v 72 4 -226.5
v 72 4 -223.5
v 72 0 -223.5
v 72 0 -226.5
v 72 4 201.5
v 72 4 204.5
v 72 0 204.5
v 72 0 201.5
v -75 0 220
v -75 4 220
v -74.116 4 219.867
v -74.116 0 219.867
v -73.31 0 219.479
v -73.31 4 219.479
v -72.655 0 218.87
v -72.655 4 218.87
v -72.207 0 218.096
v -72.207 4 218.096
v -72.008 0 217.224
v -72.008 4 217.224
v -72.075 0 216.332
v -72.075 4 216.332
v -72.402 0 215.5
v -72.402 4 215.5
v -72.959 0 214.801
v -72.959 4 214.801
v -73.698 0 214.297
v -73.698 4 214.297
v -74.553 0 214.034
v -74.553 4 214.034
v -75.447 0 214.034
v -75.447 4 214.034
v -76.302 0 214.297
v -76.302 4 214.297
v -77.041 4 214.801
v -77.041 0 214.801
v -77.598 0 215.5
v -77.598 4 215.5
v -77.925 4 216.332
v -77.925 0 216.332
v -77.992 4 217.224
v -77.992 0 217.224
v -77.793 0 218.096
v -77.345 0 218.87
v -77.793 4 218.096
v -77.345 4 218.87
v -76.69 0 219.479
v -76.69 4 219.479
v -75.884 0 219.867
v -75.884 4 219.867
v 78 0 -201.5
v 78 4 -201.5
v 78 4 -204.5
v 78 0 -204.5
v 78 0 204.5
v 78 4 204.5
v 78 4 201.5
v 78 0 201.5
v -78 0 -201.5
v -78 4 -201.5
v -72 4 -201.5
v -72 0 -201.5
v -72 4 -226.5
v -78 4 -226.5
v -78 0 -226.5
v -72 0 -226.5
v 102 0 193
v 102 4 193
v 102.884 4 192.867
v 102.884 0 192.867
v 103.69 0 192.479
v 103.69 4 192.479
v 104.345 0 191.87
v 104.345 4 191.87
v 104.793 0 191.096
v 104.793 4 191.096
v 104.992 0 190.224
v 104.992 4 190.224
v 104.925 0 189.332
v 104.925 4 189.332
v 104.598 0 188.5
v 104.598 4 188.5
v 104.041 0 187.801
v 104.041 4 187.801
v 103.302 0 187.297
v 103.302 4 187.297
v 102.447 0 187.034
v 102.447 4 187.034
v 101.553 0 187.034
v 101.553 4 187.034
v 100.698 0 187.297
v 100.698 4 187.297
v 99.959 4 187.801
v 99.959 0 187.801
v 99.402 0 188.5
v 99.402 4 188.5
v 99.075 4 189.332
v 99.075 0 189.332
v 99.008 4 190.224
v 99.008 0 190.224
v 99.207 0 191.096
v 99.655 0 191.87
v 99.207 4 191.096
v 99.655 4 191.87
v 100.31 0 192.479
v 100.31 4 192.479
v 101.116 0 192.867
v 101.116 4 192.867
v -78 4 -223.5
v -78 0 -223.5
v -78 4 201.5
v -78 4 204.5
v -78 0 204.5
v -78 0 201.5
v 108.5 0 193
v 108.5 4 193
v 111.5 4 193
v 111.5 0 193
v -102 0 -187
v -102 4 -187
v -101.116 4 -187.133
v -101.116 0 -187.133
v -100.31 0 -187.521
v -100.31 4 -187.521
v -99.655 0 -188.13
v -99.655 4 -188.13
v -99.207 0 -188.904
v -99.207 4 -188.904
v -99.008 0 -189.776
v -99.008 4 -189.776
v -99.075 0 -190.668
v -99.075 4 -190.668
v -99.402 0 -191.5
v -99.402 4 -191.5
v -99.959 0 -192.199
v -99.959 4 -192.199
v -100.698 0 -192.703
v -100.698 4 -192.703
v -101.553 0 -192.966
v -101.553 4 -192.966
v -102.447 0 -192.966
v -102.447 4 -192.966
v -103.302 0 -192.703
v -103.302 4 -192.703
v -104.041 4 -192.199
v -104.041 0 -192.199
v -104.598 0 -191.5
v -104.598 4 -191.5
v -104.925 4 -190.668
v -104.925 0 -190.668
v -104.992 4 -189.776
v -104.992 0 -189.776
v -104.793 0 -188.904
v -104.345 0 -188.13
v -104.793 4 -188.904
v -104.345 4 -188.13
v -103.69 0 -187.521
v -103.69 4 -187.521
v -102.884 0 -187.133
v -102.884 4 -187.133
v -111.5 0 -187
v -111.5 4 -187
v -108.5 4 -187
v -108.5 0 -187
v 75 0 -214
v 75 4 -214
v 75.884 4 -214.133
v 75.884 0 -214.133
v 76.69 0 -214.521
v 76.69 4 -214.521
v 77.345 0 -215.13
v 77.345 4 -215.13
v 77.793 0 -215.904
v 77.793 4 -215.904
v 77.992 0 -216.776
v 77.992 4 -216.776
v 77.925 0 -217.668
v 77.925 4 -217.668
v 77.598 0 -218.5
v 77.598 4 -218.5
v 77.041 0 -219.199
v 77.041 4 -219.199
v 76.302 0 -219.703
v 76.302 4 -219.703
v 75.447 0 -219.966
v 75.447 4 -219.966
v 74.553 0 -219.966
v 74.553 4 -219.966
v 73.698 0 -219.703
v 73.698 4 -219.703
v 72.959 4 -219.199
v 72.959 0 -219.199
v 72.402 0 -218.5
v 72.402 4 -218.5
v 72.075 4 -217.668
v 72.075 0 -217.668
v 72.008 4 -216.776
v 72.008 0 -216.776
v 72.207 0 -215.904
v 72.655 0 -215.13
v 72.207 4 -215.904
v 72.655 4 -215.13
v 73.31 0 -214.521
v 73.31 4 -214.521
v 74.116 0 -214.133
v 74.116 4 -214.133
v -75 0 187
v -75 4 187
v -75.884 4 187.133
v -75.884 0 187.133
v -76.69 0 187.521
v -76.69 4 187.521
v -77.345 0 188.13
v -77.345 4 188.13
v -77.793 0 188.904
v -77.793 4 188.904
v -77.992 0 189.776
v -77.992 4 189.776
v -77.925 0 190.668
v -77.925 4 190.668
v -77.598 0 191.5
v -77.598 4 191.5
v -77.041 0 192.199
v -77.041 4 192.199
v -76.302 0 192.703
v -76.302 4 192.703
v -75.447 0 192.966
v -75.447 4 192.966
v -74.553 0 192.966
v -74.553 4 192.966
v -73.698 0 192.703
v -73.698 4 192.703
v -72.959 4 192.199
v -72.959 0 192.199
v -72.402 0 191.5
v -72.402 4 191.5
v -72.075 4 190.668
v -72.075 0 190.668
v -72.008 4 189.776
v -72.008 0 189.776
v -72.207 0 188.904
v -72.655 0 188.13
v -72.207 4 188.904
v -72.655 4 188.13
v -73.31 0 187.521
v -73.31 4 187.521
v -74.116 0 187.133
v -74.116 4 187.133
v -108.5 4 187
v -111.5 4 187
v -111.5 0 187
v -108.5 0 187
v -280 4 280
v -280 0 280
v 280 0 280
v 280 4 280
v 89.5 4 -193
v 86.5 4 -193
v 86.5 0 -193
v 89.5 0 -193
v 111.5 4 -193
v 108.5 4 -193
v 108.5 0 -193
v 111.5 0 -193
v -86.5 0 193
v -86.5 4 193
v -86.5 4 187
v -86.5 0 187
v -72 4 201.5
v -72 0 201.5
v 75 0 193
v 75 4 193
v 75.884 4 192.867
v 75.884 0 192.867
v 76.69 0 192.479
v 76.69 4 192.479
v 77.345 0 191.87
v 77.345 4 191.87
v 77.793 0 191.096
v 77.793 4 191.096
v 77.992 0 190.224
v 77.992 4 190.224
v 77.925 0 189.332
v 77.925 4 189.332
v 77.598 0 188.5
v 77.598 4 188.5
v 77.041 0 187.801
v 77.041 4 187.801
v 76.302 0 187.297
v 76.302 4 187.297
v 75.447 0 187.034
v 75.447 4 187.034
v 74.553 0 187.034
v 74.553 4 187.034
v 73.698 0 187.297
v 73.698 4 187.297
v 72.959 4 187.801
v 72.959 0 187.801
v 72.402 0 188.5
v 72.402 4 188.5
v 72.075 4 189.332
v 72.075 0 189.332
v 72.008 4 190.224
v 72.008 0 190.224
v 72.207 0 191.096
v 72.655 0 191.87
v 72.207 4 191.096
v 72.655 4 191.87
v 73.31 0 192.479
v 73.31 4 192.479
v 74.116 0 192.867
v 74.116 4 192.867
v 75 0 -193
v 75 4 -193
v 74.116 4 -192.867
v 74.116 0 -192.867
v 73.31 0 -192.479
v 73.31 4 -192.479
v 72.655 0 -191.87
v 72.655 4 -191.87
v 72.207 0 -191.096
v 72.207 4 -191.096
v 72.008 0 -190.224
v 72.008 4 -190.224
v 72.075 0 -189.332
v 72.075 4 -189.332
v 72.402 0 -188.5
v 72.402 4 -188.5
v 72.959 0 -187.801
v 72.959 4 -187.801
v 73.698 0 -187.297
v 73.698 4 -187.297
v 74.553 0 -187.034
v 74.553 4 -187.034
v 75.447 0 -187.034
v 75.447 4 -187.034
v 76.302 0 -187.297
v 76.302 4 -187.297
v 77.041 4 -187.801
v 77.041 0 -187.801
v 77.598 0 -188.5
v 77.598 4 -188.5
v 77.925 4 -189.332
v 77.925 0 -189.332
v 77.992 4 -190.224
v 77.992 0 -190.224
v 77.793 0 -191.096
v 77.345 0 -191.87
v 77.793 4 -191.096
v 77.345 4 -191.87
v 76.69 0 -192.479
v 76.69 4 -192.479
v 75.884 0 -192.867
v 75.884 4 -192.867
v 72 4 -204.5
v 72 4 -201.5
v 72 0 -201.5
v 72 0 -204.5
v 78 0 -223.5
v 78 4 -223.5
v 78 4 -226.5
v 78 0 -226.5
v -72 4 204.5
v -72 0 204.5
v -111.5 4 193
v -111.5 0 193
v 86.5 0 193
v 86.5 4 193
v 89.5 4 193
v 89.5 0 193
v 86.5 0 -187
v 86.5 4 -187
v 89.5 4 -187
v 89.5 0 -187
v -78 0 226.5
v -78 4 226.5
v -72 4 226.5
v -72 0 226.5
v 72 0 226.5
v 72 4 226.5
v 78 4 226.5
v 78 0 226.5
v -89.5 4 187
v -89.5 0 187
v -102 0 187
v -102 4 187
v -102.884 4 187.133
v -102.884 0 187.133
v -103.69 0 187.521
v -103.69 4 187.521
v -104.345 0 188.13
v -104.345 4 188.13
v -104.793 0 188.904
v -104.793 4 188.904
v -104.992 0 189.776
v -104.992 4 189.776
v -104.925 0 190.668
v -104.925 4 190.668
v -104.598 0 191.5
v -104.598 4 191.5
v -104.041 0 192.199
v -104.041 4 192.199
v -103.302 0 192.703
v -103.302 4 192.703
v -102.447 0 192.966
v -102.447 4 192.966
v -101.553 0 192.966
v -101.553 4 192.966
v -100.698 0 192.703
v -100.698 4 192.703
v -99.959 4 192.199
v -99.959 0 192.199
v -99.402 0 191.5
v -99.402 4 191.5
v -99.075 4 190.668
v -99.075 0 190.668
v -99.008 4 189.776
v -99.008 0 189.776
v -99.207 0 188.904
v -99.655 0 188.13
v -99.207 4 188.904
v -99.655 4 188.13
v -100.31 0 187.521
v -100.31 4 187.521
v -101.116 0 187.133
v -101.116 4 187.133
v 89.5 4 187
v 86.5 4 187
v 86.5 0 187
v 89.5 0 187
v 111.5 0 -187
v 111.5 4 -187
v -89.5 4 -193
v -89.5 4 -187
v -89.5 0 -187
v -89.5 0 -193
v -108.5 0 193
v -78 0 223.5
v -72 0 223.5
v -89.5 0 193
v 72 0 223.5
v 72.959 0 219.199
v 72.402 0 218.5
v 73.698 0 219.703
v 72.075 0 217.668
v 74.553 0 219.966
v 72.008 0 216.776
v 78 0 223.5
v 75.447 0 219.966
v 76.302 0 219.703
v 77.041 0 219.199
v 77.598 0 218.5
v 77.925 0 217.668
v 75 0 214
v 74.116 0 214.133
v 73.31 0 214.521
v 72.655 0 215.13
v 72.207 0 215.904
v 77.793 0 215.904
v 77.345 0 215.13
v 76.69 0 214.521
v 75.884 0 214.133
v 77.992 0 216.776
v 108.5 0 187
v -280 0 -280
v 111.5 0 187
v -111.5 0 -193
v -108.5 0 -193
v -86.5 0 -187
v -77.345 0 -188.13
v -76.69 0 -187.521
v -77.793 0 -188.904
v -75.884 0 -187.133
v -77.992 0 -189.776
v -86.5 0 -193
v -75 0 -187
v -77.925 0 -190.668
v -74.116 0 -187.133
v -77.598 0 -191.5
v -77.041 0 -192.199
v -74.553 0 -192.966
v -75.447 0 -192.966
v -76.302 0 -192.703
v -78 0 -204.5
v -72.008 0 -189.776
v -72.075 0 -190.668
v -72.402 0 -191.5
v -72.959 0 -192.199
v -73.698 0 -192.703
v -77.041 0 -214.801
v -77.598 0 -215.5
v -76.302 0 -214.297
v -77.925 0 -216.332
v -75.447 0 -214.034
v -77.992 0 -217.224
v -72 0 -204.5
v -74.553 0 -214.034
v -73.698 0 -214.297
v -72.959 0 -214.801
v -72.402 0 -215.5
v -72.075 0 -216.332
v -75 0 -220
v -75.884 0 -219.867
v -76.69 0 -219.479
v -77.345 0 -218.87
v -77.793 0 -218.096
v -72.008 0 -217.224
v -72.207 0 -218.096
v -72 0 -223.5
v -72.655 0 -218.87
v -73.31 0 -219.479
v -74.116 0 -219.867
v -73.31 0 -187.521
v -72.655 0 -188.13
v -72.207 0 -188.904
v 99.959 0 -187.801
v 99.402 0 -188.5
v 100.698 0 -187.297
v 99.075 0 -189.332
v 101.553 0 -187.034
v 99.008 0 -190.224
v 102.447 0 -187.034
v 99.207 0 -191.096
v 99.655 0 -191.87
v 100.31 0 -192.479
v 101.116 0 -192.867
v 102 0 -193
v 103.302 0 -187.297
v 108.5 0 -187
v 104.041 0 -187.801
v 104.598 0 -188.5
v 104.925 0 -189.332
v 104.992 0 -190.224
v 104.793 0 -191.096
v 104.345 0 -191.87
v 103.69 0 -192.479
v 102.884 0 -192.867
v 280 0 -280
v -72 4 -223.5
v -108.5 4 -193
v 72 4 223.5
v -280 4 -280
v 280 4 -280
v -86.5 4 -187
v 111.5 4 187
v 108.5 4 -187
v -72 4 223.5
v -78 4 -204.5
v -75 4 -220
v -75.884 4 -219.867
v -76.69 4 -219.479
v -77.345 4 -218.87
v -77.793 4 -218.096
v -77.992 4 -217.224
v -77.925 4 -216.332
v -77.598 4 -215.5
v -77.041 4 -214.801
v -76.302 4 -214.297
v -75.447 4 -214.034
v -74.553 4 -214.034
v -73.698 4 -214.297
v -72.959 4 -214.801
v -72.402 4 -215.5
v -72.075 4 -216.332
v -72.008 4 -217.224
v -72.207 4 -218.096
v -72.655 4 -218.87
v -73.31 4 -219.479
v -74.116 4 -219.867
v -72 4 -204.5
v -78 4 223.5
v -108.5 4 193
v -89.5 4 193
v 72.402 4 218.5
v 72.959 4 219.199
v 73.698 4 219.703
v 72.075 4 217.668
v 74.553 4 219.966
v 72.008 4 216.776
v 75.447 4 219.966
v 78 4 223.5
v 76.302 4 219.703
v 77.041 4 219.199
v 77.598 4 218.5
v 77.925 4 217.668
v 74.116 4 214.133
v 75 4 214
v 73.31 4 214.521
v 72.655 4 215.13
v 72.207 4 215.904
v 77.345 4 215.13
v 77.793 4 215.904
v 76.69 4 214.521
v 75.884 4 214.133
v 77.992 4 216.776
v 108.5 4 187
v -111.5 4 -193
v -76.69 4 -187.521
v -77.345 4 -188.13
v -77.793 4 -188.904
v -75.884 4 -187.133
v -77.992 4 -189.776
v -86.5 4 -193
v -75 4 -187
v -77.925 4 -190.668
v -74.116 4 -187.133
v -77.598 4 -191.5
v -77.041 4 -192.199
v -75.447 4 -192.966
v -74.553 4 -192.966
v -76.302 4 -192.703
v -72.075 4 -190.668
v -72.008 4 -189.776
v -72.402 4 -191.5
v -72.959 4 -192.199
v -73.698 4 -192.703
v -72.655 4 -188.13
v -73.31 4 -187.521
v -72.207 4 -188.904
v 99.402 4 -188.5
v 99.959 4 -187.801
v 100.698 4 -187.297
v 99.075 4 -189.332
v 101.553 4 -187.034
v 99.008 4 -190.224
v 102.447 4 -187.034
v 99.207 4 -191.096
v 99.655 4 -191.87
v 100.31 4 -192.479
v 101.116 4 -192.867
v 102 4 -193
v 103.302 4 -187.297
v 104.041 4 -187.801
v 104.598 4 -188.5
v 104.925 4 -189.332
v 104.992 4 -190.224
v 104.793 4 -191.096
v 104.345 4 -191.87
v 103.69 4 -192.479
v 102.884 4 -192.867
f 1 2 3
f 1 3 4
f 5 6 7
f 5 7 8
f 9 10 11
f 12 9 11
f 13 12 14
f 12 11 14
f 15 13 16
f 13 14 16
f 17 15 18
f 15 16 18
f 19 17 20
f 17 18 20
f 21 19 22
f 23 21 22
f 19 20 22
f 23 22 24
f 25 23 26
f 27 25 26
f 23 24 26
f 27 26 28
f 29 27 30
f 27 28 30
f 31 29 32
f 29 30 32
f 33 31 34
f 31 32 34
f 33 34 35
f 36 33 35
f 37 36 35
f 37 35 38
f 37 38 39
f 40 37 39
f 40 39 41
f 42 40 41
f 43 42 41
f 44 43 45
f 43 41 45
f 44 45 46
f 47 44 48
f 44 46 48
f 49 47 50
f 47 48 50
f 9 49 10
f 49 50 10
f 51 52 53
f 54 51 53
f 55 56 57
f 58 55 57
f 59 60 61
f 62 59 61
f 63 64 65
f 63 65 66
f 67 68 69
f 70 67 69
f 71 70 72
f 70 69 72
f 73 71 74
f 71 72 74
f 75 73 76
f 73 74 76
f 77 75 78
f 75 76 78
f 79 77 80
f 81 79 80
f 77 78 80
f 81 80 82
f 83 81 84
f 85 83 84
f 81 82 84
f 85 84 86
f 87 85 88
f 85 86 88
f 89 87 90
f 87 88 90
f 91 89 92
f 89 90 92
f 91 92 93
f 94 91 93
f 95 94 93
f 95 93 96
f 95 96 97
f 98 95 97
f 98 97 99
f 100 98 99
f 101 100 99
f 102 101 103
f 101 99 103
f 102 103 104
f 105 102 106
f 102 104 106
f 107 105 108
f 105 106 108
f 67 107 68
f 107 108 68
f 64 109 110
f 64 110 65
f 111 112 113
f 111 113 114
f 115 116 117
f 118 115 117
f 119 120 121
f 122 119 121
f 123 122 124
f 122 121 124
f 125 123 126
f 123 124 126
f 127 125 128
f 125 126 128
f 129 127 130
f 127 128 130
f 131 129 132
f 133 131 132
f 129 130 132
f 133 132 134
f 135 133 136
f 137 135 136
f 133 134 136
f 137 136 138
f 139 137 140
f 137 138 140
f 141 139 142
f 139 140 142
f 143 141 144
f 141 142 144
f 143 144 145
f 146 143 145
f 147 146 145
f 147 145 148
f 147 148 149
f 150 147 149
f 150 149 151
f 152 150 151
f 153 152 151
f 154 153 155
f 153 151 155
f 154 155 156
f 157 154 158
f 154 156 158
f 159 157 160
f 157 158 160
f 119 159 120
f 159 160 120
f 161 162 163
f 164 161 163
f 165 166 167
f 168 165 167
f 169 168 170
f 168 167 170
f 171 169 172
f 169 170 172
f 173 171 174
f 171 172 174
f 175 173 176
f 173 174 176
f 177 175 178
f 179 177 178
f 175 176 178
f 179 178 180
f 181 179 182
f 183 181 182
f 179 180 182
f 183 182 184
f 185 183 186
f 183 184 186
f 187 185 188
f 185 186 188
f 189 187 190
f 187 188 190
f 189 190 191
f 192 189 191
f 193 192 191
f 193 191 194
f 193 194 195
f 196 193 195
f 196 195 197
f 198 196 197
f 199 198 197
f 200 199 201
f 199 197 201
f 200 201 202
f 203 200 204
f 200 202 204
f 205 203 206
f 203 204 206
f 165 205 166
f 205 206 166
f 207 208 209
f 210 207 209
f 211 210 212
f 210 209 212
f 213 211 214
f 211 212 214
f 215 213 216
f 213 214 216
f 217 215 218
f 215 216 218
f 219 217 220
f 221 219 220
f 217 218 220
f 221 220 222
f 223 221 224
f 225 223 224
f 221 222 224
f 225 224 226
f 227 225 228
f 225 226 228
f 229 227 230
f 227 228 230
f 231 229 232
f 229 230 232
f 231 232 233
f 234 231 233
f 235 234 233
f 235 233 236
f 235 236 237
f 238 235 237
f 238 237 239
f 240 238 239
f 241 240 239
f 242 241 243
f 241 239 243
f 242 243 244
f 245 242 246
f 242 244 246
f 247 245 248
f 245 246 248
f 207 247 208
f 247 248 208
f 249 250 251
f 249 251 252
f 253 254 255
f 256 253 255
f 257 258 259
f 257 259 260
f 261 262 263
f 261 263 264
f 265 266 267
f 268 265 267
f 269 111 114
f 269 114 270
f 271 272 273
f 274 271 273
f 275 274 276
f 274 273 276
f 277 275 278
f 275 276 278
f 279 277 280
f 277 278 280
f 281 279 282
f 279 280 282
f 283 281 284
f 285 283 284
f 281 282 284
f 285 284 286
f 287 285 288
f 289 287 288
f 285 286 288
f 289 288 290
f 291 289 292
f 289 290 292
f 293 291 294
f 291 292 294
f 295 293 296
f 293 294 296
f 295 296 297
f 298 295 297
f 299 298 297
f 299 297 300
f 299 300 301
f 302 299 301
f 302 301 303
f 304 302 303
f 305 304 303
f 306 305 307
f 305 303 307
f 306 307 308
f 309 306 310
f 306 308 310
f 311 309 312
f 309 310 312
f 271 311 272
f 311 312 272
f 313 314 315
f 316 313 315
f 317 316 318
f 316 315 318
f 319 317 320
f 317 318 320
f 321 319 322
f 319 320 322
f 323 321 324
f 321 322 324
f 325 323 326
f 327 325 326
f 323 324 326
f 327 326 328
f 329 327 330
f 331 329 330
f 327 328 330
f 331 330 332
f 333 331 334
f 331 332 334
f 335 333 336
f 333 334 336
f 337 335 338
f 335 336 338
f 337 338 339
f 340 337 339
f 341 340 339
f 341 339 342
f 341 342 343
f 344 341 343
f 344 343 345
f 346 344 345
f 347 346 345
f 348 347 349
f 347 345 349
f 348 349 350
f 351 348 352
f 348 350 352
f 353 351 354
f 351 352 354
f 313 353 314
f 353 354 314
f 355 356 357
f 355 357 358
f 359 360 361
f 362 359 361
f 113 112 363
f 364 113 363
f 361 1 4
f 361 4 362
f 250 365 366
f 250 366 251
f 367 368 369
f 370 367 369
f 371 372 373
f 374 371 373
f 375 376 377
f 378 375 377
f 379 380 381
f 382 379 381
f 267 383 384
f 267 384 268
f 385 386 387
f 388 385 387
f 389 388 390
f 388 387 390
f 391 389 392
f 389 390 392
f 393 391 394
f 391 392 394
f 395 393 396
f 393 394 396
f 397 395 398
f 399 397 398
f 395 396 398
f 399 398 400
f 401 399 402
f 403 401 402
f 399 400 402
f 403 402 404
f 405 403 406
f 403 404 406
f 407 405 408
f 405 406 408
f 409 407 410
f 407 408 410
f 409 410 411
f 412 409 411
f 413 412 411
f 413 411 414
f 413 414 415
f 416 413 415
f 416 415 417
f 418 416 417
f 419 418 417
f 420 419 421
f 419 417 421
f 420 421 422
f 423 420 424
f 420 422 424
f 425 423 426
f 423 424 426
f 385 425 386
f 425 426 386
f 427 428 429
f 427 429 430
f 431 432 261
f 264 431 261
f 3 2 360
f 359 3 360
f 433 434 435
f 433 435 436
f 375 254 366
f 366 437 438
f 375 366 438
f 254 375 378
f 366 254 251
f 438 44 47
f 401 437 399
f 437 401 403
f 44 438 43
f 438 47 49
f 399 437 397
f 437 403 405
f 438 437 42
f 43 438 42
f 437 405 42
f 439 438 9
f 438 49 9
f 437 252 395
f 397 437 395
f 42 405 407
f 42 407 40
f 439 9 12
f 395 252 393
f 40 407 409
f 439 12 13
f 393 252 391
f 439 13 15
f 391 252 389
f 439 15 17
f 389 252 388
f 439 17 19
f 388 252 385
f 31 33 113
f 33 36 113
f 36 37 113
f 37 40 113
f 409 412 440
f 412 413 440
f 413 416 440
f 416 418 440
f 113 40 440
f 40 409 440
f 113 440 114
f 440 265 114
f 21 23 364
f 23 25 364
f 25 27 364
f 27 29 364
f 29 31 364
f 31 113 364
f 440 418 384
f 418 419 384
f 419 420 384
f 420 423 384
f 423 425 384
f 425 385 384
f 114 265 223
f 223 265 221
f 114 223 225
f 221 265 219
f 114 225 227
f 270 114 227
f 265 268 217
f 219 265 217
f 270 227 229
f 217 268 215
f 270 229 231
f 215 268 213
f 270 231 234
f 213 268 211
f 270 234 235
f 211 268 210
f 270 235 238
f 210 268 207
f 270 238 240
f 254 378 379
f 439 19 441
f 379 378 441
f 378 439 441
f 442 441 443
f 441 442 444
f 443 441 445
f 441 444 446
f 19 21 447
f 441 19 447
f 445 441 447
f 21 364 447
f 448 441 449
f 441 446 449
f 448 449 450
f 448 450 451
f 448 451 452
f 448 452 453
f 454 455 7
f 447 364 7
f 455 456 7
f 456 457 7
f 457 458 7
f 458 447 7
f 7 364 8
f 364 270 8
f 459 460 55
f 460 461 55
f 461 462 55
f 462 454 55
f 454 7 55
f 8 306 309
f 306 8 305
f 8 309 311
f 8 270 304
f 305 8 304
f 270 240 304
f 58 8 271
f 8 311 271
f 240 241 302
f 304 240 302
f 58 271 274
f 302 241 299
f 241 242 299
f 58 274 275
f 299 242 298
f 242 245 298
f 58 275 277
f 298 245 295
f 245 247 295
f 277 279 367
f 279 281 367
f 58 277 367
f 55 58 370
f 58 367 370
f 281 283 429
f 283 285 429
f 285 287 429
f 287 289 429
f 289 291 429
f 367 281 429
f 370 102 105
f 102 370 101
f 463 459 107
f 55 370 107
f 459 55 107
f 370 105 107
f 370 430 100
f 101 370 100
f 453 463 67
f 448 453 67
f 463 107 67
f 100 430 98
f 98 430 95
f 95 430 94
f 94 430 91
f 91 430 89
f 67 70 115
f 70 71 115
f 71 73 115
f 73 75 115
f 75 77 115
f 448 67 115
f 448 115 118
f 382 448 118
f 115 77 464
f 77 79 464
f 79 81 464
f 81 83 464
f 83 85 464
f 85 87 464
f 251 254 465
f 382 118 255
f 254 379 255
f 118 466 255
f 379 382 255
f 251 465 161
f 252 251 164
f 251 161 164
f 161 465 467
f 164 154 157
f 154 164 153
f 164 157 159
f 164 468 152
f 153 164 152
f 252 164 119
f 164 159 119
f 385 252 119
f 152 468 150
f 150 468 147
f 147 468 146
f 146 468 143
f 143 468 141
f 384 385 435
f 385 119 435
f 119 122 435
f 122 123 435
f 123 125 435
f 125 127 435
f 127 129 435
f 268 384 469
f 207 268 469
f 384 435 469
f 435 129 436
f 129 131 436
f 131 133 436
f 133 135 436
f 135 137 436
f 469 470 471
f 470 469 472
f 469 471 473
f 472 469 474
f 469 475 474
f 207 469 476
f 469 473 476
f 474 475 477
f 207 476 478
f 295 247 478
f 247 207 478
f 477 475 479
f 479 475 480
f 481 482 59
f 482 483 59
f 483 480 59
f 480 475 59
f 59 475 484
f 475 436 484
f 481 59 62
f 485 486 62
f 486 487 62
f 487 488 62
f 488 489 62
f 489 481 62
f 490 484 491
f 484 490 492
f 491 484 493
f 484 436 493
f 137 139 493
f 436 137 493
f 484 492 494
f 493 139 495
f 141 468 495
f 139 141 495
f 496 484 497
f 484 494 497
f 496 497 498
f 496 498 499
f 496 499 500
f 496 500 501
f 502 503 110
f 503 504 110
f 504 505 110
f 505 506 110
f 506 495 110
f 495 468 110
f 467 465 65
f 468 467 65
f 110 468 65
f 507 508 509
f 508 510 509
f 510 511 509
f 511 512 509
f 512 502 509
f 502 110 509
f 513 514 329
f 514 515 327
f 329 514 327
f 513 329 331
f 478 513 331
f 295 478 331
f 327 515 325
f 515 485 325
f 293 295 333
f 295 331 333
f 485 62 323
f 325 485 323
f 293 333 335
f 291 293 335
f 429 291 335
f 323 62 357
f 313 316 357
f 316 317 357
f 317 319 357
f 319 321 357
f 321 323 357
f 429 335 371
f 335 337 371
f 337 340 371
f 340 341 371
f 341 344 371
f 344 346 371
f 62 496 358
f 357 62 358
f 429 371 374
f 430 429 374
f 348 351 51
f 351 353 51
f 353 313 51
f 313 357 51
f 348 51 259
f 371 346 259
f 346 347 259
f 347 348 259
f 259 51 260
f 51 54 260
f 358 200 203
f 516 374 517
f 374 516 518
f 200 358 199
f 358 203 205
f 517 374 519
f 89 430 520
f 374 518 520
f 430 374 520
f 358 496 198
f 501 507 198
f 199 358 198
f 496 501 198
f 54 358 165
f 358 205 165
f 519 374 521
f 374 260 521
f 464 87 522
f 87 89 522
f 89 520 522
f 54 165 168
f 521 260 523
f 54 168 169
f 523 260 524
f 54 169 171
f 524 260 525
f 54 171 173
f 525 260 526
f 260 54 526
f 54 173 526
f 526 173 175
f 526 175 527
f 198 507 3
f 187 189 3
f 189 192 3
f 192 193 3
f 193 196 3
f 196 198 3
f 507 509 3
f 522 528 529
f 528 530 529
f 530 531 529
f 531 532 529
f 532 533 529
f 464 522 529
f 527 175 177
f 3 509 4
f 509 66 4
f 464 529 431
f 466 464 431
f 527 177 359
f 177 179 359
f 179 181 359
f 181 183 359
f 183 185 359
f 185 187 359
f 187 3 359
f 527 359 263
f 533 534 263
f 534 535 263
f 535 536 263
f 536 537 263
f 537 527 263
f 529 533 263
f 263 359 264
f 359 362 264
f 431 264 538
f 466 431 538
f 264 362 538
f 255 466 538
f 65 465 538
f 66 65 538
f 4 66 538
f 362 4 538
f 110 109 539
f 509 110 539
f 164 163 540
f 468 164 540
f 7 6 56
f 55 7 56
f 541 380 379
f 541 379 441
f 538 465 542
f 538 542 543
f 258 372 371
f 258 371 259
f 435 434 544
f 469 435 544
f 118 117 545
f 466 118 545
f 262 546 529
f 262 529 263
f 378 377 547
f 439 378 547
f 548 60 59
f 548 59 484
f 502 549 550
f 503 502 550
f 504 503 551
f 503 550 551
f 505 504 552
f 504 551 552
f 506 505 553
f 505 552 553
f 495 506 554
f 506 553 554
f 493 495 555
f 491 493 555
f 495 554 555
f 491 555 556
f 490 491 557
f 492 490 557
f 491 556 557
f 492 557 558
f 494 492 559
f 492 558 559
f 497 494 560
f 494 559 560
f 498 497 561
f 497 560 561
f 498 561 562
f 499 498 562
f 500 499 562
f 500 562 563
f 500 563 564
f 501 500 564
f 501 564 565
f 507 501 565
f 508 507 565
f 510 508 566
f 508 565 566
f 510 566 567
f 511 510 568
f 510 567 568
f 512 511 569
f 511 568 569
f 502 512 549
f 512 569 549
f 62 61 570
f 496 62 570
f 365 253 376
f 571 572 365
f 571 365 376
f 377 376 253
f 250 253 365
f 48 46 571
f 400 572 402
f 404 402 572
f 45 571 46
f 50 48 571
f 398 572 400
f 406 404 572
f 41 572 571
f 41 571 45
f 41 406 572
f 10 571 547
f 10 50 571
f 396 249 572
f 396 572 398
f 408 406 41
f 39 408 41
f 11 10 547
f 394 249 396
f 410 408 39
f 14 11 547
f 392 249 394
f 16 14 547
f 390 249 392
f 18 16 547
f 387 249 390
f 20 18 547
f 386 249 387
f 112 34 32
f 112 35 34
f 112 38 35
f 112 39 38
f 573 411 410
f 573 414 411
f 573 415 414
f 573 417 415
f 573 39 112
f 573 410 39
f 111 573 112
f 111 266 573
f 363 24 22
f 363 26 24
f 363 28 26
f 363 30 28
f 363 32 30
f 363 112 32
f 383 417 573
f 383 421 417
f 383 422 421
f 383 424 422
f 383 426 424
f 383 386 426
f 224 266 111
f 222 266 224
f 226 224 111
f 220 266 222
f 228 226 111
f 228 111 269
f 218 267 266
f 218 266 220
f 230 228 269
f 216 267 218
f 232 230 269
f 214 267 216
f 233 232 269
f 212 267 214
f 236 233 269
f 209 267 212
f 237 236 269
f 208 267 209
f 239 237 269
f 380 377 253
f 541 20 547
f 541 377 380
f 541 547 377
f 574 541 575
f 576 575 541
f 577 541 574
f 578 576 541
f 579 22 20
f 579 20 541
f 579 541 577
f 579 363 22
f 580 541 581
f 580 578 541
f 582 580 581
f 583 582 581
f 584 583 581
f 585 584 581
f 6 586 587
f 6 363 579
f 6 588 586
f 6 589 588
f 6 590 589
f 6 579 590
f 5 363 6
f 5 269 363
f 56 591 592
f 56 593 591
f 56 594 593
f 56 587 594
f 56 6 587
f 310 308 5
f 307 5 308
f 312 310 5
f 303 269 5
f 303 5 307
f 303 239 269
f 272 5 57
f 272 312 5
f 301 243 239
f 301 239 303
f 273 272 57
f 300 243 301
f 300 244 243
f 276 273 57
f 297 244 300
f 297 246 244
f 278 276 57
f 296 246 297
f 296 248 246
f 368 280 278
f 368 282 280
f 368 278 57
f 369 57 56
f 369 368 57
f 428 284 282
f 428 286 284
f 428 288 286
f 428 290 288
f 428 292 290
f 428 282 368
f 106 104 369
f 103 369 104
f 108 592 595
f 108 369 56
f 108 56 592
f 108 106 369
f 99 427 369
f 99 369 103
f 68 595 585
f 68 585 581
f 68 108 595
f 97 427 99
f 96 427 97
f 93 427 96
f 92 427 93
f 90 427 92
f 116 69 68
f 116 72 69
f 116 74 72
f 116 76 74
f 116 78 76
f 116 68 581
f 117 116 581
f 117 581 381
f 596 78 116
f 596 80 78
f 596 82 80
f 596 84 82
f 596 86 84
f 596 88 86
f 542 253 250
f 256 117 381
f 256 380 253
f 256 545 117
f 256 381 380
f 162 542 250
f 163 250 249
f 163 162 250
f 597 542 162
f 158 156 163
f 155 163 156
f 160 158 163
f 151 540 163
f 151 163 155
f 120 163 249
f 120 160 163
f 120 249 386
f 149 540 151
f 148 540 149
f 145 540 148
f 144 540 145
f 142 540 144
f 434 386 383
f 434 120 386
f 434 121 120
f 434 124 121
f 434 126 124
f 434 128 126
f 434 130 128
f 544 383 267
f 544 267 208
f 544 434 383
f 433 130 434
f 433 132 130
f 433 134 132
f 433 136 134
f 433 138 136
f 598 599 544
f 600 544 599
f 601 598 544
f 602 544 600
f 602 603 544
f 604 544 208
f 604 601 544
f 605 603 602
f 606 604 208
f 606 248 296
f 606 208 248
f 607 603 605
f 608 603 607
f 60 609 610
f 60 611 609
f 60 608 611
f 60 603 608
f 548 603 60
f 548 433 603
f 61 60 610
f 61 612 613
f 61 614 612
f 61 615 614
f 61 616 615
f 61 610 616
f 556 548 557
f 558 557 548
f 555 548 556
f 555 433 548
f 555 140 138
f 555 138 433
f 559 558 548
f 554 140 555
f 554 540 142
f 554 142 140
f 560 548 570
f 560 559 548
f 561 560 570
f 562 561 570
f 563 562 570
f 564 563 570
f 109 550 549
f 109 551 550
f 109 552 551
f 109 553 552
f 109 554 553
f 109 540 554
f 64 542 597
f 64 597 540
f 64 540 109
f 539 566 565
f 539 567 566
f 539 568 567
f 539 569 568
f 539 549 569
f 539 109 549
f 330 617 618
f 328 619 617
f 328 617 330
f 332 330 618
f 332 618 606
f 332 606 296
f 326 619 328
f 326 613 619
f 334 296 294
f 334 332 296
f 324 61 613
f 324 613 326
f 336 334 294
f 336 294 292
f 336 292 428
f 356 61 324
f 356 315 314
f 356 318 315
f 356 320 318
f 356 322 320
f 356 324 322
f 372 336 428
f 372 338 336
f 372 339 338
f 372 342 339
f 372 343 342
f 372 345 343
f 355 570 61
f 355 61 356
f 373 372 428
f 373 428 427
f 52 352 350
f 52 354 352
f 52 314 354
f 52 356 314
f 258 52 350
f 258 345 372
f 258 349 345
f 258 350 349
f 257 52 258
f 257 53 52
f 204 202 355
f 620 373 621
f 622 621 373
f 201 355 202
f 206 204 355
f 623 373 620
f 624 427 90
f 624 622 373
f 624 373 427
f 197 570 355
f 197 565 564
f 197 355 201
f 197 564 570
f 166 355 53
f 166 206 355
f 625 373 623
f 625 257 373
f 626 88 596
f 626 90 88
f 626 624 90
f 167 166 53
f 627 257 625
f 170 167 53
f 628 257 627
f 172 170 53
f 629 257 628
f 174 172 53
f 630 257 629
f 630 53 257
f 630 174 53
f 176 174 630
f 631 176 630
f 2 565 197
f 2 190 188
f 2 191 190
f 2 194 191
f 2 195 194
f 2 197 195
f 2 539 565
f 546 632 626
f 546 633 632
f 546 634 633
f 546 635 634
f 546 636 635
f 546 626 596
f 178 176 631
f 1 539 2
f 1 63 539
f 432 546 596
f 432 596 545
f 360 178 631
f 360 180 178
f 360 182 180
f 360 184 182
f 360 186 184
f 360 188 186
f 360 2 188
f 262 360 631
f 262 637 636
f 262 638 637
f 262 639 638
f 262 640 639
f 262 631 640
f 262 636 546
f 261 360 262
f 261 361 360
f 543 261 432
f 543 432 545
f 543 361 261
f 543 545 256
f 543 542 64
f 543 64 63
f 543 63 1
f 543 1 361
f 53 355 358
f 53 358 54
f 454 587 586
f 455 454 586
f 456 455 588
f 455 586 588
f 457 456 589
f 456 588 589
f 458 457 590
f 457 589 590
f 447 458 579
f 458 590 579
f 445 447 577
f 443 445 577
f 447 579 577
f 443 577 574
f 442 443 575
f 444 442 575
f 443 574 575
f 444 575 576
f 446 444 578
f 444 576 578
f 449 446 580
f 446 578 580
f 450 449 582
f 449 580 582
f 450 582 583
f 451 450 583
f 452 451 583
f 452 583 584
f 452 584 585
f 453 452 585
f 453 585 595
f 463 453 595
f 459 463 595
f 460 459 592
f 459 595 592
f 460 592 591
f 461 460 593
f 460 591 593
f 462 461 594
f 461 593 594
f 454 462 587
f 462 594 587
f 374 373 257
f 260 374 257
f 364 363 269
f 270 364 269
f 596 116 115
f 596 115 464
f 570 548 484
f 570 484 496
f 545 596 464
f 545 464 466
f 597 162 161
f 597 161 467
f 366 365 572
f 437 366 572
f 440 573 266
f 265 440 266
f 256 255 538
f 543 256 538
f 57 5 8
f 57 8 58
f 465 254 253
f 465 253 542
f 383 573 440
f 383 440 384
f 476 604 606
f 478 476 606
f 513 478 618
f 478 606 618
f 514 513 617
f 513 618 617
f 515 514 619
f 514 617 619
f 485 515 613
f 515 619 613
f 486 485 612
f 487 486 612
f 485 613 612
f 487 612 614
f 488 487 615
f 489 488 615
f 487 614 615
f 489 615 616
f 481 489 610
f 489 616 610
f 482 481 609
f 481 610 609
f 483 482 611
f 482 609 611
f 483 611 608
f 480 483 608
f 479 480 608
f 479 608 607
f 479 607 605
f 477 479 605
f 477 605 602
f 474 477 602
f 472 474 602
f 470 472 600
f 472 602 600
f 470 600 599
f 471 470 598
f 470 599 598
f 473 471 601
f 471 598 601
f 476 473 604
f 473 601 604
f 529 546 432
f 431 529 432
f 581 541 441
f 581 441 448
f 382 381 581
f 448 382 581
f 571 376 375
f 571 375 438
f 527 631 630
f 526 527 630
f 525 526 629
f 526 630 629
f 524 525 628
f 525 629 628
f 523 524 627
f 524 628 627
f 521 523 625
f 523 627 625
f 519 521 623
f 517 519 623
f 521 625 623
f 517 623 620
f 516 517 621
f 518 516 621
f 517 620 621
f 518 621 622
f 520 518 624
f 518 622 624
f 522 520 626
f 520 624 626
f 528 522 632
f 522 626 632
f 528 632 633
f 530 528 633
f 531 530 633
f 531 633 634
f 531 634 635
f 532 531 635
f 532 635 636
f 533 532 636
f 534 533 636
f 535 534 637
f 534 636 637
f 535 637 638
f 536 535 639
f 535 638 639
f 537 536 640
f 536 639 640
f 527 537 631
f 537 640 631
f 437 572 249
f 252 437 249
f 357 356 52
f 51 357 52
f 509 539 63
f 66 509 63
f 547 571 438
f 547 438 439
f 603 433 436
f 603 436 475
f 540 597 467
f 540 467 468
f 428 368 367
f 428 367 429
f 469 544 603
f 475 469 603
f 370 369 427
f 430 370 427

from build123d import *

# Parameters (mm, degrees)
SKETCH_1_W          = 560
SKETCH_1_H          = 560
EXTRUDE_1_DEPTH     = 4
SKETCH_2_R          = 3
SKETCH_2_W          = 3
SKETCH_2_H          = 6
SKETCH_2_W_2        = 6
SKETCH_2_H_2        = 3
CUT_EXTRUDE_1_DEPTH = 4


with BuildPart() as part:
    # 草图1 → 凸台-拉伸1 (new body)
    with BuildSketch(Plane(origin=(0, 0, 0), x_dir=(1, 0, 0), z_dir=(0, 1, 0))):
        Rectangle(SKETCH_1_W, SKETCH_1_H)
    extrude(amount=EXTRUDE_1_DEPTH)

    # 草图2 → 切除-拉伸1 (cut)
    with BuildSketch(Plane(origin=(0, 4, 0), x_dir=(1, 0, 0), z_dir=(0, 1, 0))):
        with Locations(Location((-75, 190, 0), (0, 0, 270))):
            Circle(SKETCH_2_R)
        with Locations(Location((-102, 190, 0), (0, 0, 270))):
            Circle(SKETCH_2_R)
        with Locations(Location((-75, 217, 0), (0, 0, 90))):
            Circle(SKETCH_2_R)
        with Locations(Location((75, 217, 0), (0, 0, 270))):
            Circle(SKETCH_2_R)
        with Locations(Location((102, 190, 0), (0, 0, 90))):
            Circle(SKETCH_2_R)
        with Locations(Location((75, 190, 0), (0, 0, 90))):
            Circle(SKETCH_2_R)
        with Locations(Location((75, -190, 0), (0, 0, 270))):
            Circle(SKETCH_2_R)
        with Locations(Location((102, -190, 0), (0, 0, 270))):
            Circle(SKETCH_2_R)
        with Locations(Location((75, -217, 0), (0, 0, 90))):
            Circle(SKETCH_2_R)
        with Locations(Location((-75, -217, 0), (0, 0, 270))):
            Circle(SKETCH_2_R)
        with Locations(Location((-102, -190, 0), (0, 0, 90))):
            Circle(SKETCH_2_R)
        with Locations(Location((-75, -190, 0), (0, 0, 90))):
            Circle(SKETCH_2_R)
        with Locations((-88, 190)):
            Rectangle(SKETCH_2_W, SKETCH_2_H)
        with Locations((-110, 190)):
            Rectangle(SKETCH_2_W, SKETCH_2_H)
        with Locations((-75, 225)):
            Rectangle(SKETCH_2_W_2, SKETCH_2_H_2)
        with Locations((-75, 203)):
            Rectangle(SKETCH_2_W_2, SKETCH_2_H_2)
        with Locations((75, 203)):
            Rectangle(SKETCH_2_W_2, SKETCH_2_H_2)
        with Locations((75, 225)):
            Rectangle(SKETCH_2_W_2, SKETCH_2_H_2)
        with Locations((110, 190)):
            Rectangle(SKETCH_2_W, SKETCH_2_H)
        with Locations((88, 190)):
            Rectangle(SKETCH_2_W, SKETCH_2_H)
        with Locations((88, -190)):
            Rectangle(SKETCH_2_W, SKETCH_2_H)
        with Locations((110, -190)):
            Rectangle(SKETCH_2_W, SKETCH_2_H)
        with Locations((75, -225)):
            Rectangle(SKETCH_2_W_2, SKETCH_2_H_2)
        with Locations((75, -203)):
            Rectangle(SKETCH_2_W_2, SKETCH_2_H_2)
        with Locations((-75, -203)):
            Rectangle(SKETCH_2_W_2, SKETCH_2_H_2)
        with Locations((-75, -225)):
            Rectangle(SKETCH_2_W_2, SKETCH_2_H_2)
        with Locations((-110, -190)):
            Rectangle(SKETCH_2_W, SKETCH_2_H)
        with Locations((-88, -190)):
            Rectangle(SKETCH_2_W, SKETCH_2_H)
    extrude(amount=-CUT_EXTRUDE_1_DEPTH, mode=Mode.SUBTRACT)


solid = part.part
